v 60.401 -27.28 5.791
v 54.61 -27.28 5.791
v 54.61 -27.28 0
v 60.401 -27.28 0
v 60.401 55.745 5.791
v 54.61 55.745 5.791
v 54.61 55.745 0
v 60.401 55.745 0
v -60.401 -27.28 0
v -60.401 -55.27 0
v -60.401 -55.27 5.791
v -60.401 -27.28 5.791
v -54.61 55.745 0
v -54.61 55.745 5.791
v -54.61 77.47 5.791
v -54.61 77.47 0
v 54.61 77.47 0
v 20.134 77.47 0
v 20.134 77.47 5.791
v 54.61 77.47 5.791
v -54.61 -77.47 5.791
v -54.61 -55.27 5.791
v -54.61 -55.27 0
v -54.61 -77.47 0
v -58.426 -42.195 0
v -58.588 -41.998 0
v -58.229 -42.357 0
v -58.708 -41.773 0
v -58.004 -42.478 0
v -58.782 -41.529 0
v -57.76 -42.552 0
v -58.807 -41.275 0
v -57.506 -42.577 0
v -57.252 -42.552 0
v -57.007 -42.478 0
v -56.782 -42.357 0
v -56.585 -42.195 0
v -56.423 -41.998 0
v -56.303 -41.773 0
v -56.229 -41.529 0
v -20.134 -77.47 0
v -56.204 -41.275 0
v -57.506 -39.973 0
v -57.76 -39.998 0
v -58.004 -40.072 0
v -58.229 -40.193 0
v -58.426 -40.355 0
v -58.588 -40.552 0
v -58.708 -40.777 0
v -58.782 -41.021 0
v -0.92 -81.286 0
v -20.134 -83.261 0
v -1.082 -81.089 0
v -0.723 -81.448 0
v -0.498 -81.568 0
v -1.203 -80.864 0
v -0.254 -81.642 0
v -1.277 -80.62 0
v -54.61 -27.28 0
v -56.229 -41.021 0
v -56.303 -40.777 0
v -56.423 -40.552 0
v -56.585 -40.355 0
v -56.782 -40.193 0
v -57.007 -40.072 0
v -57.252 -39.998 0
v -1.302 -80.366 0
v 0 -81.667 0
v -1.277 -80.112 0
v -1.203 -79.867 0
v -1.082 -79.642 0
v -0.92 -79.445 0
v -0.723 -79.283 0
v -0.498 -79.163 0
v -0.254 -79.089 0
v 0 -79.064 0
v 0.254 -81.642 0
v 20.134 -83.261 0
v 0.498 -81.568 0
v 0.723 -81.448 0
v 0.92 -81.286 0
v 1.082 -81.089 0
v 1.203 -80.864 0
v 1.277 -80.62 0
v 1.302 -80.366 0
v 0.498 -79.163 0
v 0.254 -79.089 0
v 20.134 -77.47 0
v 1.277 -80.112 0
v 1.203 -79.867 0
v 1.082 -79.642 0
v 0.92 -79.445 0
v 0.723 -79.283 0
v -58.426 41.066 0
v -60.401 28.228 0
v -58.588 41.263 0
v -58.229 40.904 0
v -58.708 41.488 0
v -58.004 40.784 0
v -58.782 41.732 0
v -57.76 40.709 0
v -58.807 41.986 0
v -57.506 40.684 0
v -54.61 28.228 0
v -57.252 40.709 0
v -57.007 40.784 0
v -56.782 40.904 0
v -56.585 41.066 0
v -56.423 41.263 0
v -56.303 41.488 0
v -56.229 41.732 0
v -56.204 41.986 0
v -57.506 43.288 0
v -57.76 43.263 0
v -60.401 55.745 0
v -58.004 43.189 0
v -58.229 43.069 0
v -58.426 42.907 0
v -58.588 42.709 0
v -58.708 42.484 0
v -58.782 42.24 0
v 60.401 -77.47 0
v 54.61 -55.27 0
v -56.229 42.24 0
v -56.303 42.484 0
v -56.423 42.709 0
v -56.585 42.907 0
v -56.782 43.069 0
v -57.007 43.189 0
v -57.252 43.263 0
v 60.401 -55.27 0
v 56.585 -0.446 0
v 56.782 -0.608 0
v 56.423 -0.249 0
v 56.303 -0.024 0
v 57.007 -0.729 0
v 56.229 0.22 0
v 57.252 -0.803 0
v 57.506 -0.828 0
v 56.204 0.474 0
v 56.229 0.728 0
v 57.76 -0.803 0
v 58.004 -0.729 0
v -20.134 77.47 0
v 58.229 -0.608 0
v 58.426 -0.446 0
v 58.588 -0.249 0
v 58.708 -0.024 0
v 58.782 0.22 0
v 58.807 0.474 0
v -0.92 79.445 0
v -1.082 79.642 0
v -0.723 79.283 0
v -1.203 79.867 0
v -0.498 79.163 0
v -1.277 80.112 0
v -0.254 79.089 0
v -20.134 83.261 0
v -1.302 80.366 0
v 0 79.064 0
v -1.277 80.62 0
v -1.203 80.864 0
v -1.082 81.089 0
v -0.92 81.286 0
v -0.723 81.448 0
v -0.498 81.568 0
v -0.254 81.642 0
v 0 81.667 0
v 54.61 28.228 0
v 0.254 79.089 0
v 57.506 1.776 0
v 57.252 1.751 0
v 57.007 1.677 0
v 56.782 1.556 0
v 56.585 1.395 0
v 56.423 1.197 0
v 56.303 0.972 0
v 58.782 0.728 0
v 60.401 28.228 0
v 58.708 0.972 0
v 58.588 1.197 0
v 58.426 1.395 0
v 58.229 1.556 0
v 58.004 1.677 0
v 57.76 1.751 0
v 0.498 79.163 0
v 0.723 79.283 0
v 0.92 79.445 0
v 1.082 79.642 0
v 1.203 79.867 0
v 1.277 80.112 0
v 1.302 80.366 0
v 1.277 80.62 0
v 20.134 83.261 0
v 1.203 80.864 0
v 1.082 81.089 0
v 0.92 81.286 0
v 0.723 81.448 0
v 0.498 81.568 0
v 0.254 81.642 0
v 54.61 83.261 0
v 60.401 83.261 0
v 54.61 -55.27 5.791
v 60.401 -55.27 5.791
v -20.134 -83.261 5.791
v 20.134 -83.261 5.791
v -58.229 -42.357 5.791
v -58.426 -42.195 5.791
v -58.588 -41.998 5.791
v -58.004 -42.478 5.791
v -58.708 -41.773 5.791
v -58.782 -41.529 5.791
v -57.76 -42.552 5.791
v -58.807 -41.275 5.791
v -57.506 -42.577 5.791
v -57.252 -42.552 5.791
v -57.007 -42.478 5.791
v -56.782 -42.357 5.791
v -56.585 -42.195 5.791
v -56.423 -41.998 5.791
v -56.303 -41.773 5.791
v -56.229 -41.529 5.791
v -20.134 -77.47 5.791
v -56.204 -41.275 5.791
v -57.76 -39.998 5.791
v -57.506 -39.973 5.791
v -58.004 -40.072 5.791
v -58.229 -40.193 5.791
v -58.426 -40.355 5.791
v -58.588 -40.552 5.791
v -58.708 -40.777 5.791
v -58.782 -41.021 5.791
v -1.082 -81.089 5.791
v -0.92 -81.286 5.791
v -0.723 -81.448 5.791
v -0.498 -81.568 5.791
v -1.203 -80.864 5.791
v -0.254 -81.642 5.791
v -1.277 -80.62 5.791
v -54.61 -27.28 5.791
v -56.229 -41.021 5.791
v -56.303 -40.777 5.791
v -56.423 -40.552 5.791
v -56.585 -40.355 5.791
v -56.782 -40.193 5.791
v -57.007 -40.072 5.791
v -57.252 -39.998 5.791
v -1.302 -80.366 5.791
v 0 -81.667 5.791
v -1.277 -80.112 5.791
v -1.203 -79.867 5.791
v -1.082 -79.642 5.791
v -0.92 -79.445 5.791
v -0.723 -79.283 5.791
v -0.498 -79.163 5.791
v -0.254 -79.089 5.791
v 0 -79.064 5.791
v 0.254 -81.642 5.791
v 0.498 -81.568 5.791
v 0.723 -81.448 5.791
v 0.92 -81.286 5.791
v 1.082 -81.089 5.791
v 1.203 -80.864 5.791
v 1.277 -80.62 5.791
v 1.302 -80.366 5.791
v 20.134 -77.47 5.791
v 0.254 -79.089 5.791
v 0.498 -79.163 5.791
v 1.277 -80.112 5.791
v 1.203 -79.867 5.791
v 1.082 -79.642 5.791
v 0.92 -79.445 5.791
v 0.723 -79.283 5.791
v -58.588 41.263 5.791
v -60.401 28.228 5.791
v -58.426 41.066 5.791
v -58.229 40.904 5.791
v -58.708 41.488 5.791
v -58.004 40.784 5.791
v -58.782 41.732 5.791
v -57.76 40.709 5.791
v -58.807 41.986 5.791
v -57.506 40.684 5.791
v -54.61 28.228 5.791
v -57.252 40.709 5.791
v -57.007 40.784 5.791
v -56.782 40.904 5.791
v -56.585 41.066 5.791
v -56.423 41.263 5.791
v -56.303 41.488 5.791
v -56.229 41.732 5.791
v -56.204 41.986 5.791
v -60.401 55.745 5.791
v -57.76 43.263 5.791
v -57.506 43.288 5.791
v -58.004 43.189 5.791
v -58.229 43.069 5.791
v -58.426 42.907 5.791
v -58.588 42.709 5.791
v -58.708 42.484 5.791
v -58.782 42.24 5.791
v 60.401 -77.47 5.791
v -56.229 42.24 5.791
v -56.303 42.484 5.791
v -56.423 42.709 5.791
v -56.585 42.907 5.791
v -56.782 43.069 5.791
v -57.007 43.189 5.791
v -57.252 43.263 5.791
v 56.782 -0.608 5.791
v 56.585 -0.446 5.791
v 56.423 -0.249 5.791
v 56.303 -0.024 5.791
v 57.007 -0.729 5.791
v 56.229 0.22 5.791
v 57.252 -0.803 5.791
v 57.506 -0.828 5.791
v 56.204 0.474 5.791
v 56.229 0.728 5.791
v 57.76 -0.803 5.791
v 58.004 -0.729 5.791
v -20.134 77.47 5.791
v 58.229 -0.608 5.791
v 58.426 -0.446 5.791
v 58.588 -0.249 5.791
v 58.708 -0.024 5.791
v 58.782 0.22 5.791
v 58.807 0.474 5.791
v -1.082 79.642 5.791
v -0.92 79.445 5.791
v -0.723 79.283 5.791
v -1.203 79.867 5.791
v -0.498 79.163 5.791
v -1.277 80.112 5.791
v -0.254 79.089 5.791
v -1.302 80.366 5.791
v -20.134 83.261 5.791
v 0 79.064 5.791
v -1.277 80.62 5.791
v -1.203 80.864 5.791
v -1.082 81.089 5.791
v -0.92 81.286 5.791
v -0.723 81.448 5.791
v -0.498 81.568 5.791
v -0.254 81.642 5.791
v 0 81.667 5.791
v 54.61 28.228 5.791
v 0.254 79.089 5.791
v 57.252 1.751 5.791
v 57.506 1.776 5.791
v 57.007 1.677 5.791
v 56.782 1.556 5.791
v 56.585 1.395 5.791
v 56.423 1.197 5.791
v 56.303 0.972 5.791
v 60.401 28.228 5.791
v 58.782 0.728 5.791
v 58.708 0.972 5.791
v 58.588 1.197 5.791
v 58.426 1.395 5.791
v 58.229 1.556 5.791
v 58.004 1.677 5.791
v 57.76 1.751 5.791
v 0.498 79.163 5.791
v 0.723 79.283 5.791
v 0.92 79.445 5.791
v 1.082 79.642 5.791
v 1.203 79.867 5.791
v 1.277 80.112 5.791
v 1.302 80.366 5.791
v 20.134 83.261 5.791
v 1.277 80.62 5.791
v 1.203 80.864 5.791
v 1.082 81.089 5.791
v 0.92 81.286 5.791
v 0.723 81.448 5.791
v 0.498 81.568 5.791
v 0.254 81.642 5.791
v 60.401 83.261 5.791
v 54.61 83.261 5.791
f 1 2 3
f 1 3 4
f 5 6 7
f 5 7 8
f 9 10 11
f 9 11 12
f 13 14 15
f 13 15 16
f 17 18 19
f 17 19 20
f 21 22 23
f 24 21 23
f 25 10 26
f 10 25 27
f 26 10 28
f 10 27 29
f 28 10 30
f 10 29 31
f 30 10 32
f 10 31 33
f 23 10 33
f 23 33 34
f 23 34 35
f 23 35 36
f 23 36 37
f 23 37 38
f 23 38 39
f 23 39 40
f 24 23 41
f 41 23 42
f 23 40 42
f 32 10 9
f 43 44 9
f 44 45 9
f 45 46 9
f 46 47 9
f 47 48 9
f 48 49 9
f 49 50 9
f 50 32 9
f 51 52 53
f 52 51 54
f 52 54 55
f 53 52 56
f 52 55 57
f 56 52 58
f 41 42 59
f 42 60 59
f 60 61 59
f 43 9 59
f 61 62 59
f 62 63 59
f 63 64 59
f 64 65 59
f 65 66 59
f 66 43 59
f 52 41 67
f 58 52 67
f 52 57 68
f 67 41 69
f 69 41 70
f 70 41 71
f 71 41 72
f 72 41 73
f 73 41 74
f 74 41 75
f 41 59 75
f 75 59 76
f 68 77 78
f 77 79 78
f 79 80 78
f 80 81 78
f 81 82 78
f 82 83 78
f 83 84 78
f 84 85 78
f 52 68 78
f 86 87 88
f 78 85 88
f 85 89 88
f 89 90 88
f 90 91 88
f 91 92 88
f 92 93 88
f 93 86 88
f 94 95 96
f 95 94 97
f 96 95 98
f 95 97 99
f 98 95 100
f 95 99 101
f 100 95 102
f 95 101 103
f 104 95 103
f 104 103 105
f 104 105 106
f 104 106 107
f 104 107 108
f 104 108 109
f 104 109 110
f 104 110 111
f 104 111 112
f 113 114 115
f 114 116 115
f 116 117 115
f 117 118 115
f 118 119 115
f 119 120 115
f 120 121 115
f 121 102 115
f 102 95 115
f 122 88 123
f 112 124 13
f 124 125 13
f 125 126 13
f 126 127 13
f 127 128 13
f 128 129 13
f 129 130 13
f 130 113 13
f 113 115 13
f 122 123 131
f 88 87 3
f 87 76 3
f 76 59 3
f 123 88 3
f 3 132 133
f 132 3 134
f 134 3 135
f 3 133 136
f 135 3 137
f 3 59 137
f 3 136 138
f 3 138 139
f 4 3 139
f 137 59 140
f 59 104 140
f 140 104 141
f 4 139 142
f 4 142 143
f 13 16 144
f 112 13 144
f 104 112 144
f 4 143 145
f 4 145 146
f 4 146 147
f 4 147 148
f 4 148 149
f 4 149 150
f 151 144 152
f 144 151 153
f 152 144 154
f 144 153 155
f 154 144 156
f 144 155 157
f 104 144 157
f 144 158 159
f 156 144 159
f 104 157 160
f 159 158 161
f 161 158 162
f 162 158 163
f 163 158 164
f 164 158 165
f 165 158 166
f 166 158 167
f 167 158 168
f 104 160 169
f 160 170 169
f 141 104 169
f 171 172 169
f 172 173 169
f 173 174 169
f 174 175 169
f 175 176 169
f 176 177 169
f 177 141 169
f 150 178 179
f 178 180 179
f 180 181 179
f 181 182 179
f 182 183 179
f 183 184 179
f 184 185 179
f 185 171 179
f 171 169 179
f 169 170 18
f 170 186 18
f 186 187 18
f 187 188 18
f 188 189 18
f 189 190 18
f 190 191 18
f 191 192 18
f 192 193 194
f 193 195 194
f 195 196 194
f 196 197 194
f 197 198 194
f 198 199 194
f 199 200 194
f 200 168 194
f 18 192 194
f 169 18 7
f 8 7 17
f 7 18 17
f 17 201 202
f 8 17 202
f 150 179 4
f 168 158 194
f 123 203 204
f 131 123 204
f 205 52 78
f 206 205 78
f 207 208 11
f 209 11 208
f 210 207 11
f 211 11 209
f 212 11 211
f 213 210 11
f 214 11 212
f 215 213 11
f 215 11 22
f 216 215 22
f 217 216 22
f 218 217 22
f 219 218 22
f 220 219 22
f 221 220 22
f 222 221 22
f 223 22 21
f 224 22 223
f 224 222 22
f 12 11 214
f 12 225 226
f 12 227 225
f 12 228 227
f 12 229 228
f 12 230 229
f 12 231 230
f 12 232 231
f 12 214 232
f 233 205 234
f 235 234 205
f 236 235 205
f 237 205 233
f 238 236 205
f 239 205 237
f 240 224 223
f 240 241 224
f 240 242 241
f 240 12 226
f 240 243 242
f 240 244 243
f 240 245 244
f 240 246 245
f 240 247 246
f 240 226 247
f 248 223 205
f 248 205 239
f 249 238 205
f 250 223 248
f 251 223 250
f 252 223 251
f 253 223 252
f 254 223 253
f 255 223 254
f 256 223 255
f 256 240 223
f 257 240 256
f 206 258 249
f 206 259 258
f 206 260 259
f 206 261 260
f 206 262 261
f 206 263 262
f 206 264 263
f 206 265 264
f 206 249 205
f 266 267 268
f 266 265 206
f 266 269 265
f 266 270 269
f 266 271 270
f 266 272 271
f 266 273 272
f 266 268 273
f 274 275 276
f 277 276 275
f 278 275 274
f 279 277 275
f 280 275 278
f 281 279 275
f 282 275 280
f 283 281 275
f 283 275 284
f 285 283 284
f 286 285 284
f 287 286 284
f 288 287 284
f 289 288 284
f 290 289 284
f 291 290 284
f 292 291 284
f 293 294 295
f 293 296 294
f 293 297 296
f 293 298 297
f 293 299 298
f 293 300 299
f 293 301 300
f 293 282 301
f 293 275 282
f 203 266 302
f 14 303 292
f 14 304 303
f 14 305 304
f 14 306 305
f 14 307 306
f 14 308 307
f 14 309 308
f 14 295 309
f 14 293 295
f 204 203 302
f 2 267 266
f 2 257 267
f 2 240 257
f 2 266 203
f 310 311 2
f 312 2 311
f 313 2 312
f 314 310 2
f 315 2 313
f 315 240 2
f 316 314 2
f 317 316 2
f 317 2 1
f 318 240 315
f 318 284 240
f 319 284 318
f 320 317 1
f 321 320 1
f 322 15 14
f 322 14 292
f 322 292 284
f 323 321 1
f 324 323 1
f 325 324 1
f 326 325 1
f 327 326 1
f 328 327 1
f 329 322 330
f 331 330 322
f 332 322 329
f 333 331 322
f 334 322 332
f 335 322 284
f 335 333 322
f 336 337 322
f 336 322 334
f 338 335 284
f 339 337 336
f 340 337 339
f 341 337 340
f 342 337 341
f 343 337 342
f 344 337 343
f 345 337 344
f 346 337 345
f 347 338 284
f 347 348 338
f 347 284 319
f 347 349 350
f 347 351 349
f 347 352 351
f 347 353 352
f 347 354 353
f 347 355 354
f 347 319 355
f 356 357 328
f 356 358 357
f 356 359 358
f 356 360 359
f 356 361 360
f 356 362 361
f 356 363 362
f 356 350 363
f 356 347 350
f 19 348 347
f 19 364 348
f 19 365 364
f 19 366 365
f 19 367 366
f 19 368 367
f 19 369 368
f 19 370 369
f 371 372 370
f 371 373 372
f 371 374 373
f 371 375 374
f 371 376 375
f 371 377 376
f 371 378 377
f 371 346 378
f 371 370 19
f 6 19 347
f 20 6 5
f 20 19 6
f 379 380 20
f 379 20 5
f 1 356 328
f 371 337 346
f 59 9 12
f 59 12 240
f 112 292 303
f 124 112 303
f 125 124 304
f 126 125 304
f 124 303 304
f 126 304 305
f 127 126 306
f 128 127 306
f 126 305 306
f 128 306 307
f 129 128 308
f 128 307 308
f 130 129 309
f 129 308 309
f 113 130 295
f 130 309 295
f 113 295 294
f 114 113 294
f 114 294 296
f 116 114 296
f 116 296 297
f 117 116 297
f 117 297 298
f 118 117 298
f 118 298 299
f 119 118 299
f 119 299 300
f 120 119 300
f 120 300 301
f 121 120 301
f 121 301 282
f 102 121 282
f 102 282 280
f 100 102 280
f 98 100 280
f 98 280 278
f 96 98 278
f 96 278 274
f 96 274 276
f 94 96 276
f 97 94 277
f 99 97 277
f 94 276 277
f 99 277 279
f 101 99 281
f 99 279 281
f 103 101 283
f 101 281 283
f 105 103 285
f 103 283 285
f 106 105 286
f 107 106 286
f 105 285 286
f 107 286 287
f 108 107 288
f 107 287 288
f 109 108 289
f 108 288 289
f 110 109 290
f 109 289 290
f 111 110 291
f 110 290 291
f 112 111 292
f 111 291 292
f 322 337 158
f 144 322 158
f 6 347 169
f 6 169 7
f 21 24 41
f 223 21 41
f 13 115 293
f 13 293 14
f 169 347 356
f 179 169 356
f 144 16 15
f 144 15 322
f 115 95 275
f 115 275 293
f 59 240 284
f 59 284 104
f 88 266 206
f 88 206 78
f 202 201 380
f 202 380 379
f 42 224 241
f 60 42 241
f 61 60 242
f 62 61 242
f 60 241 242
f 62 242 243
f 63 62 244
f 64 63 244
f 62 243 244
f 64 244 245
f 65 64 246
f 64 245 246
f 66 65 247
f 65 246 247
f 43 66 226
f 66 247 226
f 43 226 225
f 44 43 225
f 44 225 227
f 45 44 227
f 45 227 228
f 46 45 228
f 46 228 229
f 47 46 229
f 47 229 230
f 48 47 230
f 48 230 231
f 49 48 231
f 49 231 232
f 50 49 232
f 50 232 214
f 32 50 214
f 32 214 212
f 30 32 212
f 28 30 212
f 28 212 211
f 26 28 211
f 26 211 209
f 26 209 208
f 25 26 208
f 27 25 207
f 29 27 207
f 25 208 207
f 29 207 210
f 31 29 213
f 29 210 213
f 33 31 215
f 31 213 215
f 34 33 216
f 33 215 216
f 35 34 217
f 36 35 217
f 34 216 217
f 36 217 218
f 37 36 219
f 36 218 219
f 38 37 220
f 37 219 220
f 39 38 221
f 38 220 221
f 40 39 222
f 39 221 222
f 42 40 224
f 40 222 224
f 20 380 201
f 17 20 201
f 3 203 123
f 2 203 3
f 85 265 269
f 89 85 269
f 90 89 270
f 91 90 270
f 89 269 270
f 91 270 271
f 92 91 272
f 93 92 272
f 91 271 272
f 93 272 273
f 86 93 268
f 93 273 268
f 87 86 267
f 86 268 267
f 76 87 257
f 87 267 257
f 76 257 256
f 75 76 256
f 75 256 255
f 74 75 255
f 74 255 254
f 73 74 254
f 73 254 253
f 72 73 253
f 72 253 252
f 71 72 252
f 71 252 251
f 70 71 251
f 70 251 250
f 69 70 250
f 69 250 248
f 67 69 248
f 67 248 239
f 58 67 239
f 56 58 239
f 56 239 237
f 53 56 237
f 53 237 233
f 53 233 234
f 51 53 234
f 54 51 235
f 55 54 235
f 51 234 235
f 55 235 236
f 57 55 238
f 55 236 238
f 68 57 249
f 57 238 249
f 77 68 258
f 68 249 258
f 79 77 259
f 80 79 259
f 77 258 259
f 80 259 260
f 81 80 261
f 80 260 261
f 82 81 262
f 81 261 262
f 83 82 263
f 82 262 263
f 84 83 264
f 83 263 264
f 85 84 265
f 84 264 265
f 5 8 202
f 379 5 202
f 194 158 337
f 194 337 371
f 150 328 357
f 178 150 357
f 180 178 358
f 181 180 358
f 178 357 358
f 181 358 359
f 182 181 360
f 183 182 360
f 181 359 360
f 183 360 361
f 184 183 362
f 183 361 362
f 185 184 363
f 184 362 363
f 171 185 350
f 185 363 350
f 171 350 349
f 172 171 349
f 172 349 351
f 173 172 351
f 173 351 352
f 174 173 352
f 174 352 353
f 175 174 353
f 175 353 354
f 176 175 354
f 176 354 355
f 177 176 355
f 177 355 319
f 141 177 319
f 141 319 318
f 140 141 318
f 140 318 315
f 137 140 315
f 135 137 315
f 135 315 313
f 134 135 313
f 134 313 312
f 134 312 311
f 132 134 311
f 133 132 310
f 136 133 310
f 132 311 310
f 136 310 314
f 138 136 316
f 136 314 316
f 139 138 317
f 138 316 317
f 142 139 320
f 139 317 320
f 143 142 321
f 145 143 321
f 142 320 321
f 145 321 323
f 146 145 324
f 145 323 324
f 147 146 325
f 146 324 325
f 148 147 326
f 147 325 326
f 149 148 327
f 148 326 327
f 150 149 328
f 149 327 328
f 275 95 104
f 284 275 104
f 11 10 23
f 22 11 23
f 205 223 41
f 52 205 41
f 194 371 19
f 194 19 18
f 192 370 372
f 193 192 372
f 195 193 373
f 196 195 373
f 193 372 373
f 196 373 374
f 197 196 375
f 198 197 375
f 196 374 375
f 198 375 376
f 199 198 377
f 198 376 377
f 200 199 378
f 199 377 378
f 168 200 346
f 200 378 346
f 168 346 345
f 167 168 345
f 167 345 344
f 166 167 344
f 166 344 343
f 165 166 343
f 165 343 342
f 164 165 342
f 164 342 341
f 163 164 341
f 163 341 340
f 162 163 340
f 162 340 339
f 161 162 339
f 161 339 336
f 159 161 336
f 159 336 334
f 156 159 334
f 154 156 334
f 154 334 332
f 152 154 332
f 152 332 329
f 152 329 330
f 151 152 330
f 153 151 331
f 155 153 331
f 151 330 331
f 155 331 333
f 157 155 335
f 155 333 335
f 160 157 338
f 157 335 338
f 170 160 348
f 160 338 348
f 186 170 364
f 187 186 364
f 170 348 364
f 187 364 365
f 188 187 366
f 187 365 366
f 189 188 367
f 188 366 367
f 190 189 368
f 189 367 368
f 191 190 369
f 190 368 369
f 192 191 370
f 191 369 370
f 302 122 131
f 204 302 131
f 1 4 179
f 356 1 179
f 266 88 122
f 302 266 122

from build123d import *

# Parameters (mm, degrees)
SKETCH1_W             = 120.8024
SKETCH1_H             = 166.5224
BOSS_EXTRUDE1_DEPTH   = 5.7912
SKETCH7_R             = 1.30175
CUT_EXTRUDE6_DEPTH    = 104.025581213
SKETCH9_W             = 5.7912
SKETCH9_H             = 27.9908
CUT_EXTRUDE7_DEPTH    = 104.025581213
SKETCH10_W            = 5.7912
SKETCH10_H            = 27.516666666
CUT_EXTRUDE8_DEPTH    = 104.025581213
SKETCH11_R            = 1.30175
CUT_EXTRUDE9_DEPTH    = 104.025581213
SKETCH12_R            = 1.30175
CUT_EXTRUDE10_DEPTH   = 104.025581213
CAVITY2_START         = -83.2612
CAVITY2_OUTLINE_W     = 40.267466667
CAVITY2_OUTLINE_H     = 5.7912
CAVITY2_DEPTH         = 5.7912
CAVITY2_START_2       = 77.47
CAVITY2_2_OUTLINE_W   = 40.267466667
CAVITY2_2_OUTLINE_H   = 5.7912
CAVITY2_2_OUTLINE_W_2 = 34.476266667
CAVITY2_2_DEPTH       = 5.7912
CAVITY2_START_3       = -27.2796
CAVITY2_3_OUTLINE_W   = 5.7912
CAVITY2_3_OUTLINE_H   = 5.7912
CAVITY2_3_DEPTH       = 55.507466667
CAVITY2_START_4       = -77.47
CAVITY2_4_OUTLINE_W   = 5.7912
CAVITY2_4_OUTLINE_H   = 5.7912
CAVITY2_4_DEPTH       = 22.1996
CAVITY2_START_5       = 55.744533333
CAVITY2_5_OUTLINE_W   = 5.7912
CAVITY2_5_OUTLINE_H   = 5.7912
CAVITY2_5_DEPTH       = 21.725466667


# Read off the part's stored shape, not the designer's step: Cavity2
with BuildPart() as part:
    # Sketch1 → Boss-Extrude1 (new body)
    with BuildSketch(Plane.XY):
        Rectangle(SKETCH1_W, SKETCH1_H)
    extrude(amount=BOSS_EXTRUDE1_DEPTH)

    # Sketch7 → Cut-Extrude6 (cut, through all)
    with BuildSketch(Plane.XY.offset(5.7912)):
        with Locations((-57.5056, -41.275)):
            Circle(SKETCH7_R)
        with Locations((-57.5056, 41.9862)):
            Circle(SKETCH7_R)
        with Locations(Location((58.473654732, -41.275, 0), (0, 0, 180))):
            Circle(SKETCH7_R)
        with Locations(Location((58.473654732, 41.9862, 0), (0, 0, 180))):
            Circle(SKETCH7_R)
    extrude(amount=-CUT_EXTRUDE6_DEPTH, mode=Mode.SUBTRACT)

    # Sketch9 → Cut-Extrude7 (cut, through all)
    with BuildSketch(Plane.XY.offset(5.7912)):
        with Locations((57.5056, -41.275)):
            Rectangle(SKETCH9_W, SKETCH9_H)
    extrude(amount=-CUT_EXTRUDE7_DEPTH, mode=Mode.SUBTRACT)

    # Sketch10 → Cut-Extrude8 (cut, through all)
    with BuildSketch(Plane.XY.offset(5.7912)):
        with Locations((57.5056, 41.9862)):
            Rectangle(SKETCH10_W, SKETCH10_H)
    extrude(amount=-CUT_EXTRUDE8_DEPTH, mode=Mode.SUBTRACT)

    # Sketch11 → Cut-Extrude9 (cut, through all)
    with BuildSketch(Plane.XY.offset(5.7912)):
        with Locations((57.5056, 0.474133333)):
            Circle(SKETCH11_R)
    extrude(amount=-CUT_EXTRUDE9_DEPTH, mode=Mode.SUBTRACT)

    # Sketch12 → Cut-Extrude10 (cut, through all)
    with BuildSketch(Plane.XY.offset(5.7912)):
        with Locations((0, 80.3656)):
            Circle(SKETCH12_R)
        with Locations((0, -80.3656)):
            Circle(SKETCH12_R)
    extrude(amount=-CUT_EXTRUDE10_DEPTH, mode=Mode.SUBTRACT)

    # Cavity2 outline → Cavity2 (cut)
    with BuildSketch(Plane(origin=(0, 0, 0), x_dir=(1, 0, 0), z_dir=(0, 1, 0)).offset(CAVITY2_START)):
        with Locations((-40.267466666, -2.8956)):
            Rectangle(CAVITY2_OUTLINE_W, CAVITY2_OUTLINE_H)
        with Locations((40.267466666, -2.8956)):
            Rectangle(CAVITY2_OUTLINE_W, CAVITY2_OUTLINE_H)
    extrude(amount=CAVITY2_DEPTH, mode=Mode.SUBTRACT)

    # Cavity2 2 outline → Cavity2 2 (cut)
    with BuildSketch(Plane(origin=(0, 0, 0), x_dir=(1, 0, 0), z_dir=(0, 1, 0)).offset(CAVITY2_START_2)):
        with Locations((-40.267466666, -2.8956)):
            Rectangle(CAVITY2_2_OUTLINE_W, CAVITY2_2_OUTLINE_H)
        with Locations((37.371866667, -2.8956)):
            Rectangle(CAVITY2_2_OUTLINE_W_2, CAVITY2_2_OUTLINE_H)
    extrude(amount=CAVITY2_2_DEPTH, mode=Mode.SUBTRACT)

    # Cavity2 3 outline → Cavity2 3 (cut)
    with BuildSketch(Plane(origin=(0, 0, 0), x_dir=(1, 0, 0), z_dir=(0, 1, 0)).offset(CAVITY2_START_3)):
        with Locations((-57.5056, -2.8956)):
            Rectangle(CAVITY2_3_OUTLINE_W, CAVITY2_3_OUTLINE_H)
    extrude(amount=CAVITY2_3_DEPTH, mode=Mode.SUBTRACT)

    # Cavity2 4 outline → Cavity2 4 (cut)
    with BuildSketch(Plane(origin=(0, 0, 0), x_dir=(1, 0, 0), z_dir=(0, 1, 0)).offset(CAVITY2_START_4)):
        with Locations((-57.5056, -2.8956)):
            Rectangle(CAVITY2_4_OUTLINE_W, CAVITY2_4_OUTLINE_H)
    extrude(amount=CAVITY2_4_DEPTH, mode=Mode.SUBTRACT)

    # Cavity2 5 outline → Cavity2 5 (cut)
    with BuildSketch(Plane(origin=(0, 0, 0), x_dir=(1, 0, 0), z_dir=(0, 1, 0)).offset(CAVITY2_START_5)):
        with Locations((-57.5056, -2.8956)):
            Rectangle(CAVITY2_5_OUTLINE_W, CAVITY2_5_OUTLINE_H)
    extrude(amount=CAVITY2_5_DEPTH, mode=Mode.SUBTRACT)


solid = part.part
